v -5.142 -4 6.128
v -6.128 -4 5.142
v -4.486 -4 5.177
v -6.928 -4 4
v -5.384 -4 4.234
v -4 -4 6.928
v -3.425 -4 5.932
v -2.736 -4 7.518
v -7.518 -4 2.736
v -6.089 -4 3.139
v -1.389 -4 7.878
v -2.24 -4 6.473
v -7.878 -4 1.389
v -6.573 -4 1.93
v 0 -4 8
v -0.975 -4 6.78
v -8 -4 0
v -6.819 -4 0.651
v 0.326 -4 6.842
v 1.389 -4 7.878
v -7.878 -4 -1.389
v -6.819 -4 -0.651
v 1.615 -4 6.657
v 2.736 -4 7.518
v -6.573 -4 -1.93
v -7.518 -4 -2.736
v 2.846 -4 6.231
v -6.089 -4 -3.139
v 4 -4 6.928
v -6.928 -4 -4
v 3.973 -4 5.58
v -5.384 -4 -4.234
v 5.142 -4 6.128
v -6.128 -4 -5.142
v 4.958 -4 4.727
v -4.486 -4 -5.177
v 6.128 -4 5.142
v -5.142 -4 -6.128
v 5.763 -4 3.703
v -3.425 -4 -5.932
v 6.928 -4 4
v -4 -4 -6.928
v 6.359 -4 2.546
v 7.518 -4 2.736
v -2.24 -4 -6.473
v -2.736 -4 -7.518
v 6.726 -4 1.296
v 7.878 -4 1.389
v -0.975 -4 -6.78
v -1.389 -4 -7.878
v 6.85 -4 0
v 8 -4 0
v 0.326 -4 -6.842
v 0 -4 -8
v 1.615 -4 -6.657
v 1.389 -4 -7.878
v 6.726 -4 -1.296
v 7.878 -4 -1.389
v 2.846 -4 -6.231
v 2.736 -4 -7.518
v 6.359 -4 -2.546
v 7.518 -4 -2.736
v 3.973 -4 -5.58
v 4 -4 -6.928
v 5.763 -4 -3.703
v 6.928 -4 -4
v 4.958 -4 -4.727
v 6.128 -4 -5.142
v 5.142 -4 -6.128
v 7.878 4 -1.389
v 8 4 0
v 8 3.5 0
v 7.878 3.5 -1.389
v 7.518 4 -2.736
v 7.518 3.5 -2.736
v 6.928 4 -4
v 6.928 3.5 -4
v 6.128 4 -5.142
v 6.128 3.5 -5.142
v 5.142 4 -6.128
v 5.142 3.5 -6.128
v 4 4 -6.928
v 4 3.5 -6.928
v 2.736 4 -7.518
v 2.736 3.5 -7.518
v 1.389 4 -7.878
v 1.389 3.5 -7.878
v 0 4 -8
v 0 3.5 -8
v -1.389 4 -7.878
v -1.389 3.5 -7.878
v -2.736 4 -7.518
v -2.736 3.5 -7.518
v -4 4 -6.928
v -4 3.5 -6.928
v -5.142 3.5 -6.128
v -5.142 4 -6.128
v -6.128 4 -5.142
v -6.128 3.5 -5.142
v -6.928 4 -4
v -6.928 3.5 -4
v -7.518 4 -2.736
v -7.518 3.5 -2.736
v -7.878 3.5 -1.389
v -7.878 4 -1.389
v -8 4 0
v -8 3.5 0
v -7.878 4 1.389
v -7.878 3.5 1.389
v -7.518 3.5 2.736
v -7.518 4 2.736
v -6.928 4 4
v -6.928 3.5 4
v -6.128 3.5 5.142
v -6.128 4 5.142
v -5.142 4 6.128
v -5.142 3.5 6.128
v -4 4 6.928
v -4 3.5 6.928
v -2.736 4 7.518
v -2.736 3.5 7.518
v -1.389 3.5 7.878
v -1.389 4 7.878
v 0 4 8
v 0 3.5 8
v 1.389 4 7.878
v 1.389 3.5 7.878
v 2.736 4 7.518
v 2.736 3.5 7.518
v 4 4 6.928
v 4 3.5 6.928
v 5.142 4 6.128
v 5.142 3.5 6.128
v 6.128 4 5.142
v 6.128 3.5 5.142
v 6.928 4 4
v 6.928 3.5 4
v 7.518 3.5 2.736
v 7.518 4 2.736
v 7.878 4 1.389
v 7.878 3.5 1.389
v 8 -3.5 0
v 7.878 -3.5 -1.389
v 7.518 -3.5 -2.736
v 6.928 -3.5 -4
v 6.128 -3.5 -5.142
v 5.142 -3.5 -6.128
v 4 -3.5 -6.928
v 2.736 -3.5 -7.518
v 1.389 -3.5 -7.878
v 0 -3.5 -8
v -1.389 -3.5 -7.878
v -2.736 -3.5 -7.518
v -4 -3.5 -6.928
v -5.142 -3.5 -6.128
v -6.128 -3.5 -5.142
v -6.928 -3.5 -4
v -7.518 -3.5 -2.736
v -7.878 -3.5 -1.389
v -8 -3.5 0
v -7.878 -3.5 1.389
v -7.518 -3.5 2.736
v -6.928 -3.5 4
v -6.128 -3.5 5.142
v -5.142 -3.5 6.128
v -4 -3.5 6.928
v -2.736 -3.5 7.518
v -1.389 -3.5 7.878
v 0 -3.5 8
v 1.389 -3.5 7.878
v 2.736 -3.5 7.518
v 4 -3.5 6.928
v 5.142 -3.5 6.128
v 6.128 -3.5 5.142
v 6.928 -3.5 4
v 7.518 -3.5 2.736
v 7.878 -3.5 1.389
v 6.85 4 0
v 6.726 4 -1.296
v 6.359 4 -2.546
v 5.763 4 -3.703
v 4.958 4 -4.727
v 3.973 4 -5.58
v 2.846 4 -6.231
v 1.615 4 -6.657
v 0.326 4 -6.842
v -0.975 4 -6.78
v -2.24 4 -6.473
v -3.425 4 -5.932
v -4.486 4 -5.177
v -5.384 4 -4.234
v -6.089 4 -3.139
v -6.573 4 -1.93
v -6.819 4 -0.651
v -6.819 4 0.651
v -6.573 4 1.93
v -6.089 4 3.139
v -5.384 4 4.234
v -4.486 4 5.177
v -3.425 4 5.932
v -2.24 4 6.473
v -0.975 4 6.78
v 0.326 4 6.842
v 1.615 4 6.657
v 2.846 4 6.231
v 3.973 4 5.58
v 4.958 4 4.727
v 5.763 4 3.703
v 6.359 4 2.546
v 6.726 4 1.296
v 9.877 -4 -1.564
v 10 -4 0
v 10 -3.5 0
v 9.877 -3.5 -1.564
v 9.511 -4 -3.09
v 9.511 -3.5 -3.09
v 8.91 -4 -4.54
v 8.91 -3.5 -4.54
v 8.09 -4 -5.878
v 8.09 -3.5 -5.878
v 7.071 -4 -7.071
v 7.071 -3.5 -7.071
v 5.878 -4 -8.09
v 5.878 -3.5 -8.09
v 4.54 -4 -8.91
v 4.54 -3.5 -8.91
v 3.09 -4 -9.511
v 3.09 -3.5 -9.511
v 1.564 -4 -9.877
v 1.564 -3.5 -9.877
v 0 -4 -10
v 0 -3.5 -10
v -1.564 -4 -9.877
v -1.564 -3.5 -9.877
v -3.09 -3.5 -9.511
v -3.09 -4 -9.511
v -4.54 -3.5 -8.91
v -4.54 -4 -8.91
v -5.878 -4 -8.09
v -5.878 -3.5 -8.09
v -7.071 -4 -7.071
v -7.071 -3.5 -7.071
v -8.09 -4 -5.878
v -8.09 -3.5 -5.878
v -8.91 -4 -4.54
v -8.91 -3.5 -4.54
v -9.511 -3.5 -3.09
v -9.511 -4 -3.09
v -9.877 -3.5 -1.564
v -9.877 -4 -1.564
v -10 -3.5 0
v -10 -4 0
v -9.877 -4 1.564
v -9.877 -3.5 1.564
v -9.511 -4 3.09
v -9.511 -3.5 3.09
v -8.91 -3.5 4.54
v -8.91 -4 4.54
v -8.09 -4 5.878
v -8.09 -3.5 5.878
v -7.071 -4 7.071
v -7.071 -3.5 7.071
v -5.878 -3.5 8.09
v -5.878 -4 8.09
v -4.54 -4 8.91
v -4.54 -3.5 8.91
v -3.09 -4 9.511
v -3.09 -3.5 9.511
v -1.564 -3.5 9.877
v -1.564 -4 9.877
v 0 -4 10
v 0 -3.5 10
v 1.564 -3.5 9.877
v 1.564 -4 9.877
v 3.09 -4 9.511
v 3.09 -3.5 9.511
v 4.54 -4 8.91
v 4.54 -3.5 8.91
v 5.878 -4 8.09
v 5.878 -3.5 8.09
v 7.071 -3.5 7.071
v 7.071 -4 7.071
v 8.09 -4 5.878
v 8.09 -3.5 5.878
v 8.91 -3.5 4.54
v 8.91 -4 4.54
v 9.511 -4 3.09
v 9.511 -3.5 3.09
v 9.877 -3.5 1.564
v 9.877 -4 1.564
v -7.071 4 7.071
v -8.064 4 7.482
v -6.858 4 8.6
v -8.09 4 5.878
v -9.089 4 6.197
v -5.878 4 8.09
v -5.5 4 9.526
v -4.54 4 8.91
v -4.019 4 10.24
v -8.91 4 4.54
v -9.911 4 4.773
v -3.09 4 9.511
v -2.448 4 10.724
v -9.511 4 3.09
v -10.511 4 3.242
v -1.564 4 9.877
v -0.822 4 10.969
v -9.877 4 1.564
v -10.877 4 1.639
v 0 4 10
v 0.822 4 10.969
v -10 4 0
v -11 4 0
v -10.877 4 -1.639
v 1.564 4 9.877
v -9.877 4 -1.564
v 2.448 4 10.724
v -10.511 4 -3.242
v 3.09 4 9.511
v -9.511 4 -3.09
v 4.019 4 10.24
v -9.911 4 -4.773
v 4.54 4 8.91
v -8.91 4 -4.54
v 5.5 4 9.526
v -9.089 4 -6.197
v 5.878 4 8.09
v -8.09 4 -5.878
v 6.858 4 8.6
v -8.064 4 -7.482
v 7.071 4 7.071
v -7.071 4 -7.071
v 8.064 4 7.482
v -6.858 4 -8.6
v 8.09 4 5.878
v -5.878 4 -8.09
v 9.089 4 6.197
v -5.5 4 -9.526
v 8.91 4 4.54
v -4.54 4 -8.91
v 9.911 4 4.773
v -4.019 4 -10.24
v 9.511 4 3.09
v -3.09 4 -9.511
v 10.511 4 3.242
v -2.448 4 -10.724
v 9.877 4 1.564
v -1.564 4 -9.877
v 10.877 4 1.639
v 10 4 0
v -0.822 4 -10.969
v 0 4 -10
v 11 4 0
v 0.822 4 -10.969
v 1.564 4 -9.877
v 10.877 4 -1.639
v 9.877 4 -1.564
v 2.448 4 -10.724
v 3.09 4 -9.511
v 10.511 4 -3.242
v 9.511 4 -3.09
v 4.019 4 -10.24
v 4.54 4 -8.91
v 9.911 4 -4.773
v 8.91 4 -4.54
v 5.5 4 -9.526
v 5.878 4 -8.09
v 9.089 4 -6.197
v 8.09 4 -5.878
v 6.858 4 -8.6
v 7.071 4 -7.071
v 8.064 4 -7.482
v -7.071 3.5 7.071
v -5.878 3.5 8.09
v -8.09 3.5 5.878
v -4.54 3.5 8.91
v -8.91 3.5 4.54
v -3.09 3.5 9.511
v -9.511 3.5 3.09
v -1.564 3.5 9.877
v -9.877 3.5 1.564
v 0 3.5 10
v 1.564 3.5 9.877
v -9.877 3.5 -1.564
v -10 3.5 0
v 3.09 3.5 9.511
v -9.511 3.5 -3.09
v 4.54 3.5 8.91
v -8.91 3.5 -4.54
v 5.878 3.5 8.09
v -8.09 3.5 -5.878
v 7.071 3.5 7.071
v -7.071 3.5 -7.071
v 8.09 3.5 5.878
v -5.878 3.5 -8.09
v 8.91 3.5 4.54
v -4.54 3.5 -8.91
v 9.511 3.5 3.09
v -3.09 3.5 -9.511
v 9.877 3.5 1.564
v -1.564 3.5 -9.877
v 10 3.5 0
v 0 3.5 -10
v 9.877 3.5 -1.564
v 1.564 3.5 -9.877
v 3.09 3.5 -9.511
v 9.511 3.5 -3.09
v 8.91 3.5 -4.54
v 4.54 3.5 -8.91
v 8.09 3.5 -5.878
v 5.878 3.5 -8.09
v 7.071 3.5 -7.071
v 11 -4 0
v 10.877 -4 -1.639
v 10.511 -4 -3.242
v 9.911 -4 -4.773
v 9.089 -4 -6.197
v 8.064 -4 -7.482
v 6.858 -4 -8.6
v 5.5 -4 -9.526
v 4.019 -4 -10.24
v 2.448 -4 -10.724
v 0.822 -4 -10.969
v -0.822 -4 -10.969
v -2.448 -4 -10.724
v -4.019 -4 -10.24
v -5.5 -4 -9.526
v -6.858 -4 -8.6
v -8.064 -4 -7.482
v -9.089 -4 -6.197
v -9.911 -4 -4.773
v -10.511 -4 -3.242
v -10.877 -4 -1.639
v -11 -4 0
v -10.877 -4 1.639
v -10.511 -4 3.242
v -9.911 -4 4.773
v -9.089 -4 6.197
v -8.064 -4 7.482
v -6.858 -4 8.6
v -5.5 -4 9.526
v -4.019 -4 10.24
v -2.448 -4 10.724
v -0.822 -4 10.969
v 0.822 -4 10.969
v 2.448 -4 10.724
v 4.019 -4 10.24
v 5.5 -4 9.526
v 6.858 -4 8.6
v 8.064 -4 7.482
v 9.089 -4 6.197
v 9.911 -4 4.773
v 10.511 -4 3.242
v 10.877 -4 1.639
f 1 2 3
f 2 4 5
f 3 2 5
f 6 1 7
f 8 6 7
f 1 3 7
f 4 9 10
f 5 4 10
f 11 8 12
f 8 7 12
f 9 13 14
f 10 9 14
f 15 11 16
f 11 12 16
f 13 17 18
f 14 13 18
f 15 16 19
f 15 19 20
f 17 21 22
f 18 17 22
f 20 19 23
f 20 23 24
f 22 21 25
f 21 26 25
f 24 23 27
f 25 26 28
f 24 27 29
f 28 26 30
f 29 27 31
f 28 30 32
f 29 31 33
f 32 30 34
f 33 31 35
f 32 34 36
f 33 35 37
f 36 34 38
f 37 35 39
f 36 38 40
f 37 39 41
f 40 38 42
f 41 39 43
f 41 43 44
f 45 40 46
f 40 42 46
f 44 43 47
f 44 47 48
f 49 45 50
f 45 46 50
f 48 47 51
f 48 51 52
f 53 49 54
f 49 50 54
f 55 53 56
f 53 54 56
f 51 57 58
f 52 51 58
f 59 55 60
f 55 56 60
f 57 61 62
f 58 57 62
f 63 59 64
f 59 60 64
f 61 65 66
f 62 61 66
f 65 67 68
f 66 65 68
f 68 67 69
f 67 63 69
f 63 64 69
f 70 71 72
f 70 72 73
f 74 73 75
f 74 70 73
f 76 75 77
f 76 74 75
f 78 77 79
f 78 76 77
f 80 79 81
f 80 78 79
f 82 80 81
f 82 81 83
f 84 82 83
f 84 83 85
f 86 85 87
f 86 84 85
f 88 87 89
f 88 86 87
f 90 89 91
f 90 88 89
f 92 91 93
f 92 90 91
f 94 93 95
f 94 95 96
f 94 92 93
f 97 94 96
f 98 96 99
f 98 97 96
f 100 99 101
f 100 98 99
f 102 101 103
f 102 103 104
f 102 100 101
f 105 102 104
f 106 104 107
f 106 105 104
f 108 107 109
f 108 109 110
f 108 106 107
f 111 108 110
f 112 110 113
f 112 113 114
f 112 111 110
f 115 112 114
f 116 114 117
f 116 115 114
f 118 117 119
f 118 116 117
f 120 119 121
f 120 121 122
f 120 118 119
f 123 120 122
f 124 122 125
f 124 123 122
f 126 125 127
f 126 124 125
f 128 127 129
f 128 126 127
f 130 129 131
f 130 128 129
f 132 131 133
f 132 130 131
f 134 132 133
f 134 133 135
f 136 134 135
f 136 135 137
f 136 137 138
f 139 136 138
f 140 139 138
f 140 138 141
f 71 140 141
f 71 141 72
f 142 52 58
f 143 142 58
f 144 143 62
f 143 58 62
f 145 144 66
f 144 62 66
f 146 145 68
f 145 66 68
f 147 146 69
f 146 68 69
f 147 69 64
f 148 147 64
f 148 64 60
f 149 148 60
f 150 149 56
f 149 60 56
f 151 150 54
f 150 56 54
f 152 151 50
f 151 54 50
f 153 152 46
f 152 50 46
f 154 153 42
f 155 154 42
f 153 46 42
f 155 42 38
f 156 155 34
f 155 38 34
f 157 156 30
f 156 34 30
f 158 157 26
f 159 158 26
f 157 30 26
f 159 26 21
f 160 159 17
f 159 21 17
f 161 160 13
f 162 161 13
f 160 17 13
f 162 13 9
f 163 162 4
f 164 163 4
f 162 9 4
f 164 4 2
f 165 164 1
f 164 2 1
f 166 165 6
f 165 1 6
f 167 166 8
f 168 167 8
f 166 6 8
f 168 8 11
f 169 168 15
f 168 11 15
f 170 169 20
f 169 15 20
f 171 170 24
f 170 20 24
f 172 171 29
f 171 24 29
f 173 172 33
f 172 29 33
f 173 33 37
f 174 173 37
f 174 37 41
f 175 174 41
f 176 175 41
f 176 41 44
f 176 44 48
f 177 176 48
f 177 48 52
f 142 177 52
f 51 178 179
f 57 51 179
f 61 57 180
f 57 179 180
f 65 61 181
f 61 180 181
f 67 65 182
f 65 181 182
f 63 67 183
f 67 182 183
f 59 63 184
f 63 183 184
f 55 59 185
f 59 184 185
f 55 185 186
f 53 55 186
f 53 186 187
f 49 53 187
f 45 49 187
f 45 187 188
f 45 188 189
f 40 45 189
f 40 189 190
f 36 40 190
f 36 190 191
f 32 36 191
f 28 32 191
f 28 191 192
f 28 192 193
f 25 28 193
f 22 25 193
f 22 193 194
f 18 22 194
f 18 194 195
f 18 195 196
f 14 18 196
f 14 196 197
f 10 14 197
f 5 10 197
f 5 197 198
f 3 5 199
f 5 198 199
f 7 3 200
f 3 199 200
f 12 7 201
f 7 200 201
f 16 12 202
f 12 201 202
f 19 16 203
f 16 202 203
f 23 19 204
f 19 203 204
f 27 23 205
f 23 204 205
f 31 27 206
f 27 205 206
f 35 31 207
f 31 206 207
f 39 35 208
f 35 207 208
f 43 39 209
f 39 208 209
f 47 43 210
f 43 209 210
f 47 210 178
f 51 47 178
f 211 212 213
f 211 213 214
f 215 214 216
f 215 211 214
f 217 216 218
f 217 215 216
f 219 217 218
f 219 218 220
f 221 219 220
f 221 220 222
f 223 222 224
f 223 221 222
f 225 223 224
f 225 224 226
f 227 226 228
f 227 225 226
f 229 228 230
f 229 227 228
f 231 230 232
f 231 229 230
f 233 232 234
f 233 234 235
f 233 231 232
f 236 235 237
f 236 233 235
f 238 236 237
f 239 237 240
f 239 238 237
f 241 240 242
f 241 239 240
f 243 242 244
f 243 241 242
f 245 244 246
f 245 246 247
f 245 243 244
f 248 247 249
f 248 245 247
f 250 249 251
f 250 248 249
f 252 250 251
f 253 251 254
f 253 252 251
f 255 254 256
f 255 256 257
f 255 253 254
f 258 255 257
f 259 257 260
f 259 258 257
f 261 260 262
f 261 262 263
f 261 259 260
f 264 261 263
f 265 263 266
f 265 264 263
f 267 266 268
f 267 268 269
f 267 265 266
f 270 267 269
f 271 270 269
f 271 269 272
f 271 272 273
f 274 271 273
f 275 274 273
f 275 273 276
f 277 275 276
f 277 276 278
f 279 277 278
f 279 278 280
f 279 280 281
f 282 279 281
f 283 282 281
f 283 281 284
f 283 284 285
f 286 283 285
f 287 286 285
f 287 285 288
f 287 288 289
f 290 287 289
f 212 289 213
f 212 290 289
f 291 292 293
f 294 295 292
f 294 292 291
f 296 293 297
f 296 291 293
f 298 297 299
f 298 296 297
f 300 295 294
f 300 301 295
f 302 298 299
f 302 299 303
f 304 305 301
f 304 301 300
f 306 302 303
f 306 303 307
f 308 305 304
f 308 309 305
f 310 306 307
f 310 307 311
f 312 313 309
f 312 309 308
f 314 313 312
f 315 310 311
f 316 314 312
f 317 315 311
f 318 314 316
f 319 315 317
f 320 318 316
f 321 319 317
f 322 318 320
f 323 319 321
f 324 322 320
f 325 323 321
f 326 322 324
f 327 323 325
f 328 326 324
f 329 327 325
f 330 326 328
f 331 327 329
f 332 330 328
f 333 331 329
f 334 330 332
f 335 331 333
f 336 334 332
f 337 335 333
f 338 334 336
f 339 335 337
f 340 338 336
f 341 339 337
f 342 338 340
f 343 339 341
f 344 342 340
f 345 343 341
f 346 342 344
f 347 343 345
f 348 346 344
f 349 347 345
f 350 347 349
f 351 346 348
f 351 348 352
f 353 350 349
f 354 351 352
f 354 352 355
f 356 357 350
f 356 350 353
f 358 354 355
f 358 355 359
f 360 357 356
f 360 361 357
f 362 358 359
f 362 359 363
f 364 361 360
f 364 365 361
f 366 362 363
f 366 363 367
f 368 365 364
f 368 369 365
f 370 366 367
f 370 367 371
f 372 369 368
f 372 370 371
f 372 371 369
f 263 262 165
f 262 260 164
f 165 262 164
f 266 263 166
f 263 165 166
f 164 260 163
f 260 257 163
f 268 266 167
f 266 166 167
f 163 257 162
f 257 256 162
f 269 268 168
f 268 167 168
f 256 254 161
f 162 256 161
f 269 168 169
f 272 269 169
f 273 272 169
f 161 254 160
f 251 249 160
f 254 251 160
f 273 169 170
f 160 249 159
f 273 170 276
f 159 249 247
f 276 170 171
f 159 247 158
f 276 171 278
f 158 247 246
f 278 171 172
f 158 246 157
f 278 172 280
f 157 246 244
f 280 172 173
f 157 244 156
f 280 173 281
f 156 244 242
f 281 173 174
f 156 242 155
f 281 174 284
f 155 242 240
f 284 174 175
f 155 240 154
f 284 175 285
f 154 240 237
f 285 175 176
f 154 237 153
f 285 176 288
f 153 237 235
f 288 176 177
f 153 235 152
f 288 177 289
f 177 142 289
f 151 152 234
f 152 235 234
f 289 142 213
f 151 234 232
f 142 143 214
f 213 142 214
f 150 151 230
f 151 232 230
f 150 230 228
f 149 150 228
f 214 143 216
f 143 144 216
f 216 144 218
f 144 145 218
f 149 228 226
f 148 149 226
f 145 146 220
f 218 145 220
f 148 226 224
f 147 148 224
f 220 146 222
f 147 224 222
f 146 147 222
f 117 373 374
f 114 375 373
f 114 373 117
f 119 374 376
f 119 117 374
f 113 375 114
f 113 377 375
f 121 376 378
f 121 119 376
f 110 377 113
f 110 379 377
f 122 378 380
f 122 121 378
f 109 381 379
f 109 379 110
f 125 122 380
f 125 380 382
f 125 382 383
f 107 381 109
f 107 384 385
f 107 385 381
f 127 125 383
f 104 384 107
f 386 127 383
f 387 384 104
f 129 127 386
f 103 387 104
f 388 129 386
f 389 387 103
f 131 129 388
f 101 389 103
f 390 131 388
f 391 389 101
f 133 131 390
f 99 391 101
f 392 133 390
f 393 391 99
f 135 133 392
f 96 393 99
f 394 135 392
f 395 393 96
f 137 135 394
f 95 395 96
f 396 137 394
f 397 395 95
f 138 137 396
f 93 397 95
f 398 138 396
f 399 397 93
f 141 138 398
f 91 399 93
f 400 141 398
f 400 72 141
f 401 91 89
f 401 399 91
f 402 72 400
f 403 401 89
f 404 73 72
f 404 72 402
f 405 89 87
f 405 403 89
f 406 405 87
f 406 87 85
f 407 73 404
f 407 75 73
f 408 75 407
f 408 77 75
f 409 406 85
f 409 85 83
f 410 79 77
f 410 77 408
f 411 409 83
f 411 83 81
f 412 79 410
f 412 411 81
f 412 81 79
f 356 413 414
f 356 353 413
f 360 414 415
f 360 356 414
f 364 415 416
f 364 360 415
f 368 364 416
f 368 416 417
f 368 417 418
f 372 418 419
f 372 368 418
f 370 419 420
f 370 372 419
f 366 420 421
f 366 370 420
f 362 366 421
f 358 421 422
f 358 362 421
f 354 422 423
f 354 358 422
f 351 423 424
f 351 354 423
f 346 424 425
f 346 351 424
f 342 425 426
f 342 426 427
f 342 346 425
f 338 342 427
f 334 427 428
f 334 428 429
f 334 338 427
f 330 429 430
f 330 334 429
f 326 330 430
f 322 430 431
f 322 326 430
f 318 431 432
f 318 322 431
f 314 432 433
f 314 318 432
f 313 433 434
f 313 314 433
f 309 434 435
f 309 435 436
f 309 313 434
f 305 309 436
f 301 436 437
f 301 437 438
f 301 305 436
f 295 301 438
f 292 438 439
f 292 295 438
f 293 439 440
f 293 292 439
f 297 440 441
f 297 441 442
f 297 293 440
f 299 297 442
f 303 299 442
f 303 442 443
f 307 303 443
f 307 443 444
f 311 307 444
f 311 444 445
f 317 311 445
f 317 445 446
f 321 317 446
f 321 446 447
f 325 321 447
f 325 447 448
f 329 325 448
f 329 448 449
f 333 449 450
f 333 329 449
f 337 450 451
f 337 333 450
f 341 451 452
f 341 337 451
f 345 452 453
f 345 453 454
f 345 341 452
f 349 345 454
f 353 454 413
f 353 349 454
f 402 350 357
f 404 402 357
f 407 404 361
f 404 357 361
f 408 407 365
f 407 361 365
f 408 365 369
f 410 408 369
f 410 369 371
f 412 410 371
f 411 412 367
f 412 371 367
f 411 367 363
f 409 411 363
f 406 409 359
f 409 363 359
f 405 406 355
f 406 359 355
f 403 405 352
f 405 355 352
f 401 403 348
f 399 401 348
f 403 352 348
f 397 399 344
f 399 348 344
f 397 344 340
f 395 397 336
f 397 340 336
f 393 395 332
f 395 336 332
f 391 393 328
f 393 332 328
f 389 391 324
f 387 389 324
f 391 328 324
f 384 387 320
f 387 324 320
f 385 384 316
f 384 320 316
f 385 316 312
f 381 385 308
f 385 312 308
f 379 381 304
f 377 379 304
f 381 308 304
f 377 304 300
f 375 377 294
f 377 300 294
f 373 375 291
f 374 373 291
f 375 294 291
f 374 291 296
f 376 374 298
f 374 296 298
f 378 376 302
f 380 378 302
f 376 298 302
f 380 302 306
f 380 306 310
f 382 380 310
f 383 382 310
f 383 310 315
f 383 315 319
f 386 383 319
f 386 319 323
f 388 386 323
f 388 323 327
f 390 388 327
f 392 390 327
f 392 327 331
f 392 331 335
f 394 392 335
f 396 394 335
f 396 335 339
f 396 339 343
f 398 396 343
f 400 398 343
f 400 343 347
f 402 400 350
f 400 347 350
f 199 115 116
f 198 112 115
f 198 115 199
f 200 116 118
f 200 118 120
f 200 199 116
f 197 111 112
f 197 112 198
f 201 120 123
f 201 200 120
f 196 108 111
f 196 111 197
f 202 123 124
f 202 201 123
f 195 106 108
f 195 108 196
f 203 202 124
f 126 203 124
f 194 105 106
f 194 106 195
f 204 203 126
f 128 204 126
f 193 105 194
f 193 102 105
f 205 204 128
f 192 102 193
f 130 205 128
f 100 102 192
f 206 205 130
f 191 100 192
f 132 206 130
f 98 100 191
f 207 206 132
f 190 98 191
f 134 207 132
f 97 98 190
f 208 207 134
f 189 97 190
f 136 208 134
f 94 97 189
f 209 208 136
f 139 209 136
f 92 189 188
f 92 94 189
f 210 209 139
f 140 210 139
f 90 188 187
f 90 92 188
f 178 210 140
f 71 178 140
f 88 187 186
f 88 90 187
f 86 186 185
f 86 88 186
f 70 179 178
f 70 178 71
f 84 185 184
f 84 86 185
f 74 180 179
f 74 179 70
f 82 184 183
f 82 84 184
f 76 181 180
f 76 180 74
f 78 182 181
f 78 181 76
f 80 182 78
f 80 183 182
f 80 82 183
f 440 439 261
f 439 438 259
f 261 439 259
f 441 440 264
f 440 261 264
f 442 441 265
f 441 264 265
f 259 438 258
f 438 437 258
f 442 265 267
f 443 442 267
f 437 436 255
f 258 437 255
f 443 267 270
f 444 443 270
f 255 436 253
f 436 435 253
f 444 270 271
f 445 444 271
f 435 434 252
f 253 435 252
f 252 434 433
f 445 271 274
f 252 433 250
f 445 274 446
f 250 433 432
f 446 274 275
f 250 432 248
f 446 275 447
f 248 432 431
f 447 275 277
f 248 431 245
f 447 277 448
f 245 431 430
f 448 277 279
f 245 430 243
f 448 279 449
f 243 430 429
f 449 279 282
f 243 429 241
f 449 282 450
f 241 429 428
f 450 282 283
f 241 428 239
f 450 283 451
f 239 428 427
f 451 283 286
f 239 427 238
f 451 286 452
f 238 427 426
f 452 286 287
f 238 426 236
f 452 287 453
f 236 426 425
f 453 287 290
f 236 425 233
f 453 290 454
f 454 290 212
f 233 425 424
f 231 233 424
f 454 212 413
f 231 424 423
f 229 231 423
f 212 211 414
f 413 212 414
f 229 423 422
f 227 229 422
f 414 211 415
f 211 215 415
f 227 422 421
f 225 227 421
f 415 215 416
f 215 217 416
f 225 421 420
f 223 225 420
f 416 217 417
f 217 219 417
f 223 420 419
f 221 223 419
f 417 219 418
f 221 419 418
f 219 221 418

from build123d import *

# Parameters (mm, degrees)
SKETCH1_R           = 11
BOSS_EXTRUDE1_DEPTH = 4
SKETCH2_R           = 6.85
CUT_EXTRUDE1_DEPTH  = 11.96
SKETCH3_R           = 10
SKETCH3_R_2         = 8
CUT_EXTRUDE2_DEPTH  = 0.5


with BuildPart() as part:
    # Sketch1 → Boss-Extrude1 (new body, symmetric)
    with BuildSketch(Plane(origin=(0, 0, 0), x_dir=(1, 0, 0), z_dir=(0, 1, 0))):
        Circle(SKETCH1_R)
    extrude(amount=BOSS_EXTRUDE1_DEPTH, both=True)

    # Sketch2 → Cut-Extrude1 (cut)
    with BuildSketch(Plane(origin=(0, 4, 0), x_dir=(1, 0, 0), z_dir=(0, 1, 0))):
        Circle(SKETCH2_R)
    extrude(amount=-CUT_EXTRUDE1_DEPTH, mode=Mode.SUBTRACT)

    # Sketch3 → Cut-Extrude2 (cut)
    with BuildSketch(Plane(origin=(0, 4, 0), x_dir=(1, 0, 0), z_dir=(0, 1, 0))):
        Circle(SKETCH3_R)
        Circle(SKETCH3_R_2, mode=Mode.SUBTRACT)
    cut_extrude2 = extrude(amount=-CUT_EXTRUDE2_DEPTH, mode=Mode.SUBTRACT)

    # Mirror1: Cut-Extrude2 across plane
    add(cut_extrude2.mirror(Plane.ZX), mode=Mode.SUBTRACT)


solid = part.part
